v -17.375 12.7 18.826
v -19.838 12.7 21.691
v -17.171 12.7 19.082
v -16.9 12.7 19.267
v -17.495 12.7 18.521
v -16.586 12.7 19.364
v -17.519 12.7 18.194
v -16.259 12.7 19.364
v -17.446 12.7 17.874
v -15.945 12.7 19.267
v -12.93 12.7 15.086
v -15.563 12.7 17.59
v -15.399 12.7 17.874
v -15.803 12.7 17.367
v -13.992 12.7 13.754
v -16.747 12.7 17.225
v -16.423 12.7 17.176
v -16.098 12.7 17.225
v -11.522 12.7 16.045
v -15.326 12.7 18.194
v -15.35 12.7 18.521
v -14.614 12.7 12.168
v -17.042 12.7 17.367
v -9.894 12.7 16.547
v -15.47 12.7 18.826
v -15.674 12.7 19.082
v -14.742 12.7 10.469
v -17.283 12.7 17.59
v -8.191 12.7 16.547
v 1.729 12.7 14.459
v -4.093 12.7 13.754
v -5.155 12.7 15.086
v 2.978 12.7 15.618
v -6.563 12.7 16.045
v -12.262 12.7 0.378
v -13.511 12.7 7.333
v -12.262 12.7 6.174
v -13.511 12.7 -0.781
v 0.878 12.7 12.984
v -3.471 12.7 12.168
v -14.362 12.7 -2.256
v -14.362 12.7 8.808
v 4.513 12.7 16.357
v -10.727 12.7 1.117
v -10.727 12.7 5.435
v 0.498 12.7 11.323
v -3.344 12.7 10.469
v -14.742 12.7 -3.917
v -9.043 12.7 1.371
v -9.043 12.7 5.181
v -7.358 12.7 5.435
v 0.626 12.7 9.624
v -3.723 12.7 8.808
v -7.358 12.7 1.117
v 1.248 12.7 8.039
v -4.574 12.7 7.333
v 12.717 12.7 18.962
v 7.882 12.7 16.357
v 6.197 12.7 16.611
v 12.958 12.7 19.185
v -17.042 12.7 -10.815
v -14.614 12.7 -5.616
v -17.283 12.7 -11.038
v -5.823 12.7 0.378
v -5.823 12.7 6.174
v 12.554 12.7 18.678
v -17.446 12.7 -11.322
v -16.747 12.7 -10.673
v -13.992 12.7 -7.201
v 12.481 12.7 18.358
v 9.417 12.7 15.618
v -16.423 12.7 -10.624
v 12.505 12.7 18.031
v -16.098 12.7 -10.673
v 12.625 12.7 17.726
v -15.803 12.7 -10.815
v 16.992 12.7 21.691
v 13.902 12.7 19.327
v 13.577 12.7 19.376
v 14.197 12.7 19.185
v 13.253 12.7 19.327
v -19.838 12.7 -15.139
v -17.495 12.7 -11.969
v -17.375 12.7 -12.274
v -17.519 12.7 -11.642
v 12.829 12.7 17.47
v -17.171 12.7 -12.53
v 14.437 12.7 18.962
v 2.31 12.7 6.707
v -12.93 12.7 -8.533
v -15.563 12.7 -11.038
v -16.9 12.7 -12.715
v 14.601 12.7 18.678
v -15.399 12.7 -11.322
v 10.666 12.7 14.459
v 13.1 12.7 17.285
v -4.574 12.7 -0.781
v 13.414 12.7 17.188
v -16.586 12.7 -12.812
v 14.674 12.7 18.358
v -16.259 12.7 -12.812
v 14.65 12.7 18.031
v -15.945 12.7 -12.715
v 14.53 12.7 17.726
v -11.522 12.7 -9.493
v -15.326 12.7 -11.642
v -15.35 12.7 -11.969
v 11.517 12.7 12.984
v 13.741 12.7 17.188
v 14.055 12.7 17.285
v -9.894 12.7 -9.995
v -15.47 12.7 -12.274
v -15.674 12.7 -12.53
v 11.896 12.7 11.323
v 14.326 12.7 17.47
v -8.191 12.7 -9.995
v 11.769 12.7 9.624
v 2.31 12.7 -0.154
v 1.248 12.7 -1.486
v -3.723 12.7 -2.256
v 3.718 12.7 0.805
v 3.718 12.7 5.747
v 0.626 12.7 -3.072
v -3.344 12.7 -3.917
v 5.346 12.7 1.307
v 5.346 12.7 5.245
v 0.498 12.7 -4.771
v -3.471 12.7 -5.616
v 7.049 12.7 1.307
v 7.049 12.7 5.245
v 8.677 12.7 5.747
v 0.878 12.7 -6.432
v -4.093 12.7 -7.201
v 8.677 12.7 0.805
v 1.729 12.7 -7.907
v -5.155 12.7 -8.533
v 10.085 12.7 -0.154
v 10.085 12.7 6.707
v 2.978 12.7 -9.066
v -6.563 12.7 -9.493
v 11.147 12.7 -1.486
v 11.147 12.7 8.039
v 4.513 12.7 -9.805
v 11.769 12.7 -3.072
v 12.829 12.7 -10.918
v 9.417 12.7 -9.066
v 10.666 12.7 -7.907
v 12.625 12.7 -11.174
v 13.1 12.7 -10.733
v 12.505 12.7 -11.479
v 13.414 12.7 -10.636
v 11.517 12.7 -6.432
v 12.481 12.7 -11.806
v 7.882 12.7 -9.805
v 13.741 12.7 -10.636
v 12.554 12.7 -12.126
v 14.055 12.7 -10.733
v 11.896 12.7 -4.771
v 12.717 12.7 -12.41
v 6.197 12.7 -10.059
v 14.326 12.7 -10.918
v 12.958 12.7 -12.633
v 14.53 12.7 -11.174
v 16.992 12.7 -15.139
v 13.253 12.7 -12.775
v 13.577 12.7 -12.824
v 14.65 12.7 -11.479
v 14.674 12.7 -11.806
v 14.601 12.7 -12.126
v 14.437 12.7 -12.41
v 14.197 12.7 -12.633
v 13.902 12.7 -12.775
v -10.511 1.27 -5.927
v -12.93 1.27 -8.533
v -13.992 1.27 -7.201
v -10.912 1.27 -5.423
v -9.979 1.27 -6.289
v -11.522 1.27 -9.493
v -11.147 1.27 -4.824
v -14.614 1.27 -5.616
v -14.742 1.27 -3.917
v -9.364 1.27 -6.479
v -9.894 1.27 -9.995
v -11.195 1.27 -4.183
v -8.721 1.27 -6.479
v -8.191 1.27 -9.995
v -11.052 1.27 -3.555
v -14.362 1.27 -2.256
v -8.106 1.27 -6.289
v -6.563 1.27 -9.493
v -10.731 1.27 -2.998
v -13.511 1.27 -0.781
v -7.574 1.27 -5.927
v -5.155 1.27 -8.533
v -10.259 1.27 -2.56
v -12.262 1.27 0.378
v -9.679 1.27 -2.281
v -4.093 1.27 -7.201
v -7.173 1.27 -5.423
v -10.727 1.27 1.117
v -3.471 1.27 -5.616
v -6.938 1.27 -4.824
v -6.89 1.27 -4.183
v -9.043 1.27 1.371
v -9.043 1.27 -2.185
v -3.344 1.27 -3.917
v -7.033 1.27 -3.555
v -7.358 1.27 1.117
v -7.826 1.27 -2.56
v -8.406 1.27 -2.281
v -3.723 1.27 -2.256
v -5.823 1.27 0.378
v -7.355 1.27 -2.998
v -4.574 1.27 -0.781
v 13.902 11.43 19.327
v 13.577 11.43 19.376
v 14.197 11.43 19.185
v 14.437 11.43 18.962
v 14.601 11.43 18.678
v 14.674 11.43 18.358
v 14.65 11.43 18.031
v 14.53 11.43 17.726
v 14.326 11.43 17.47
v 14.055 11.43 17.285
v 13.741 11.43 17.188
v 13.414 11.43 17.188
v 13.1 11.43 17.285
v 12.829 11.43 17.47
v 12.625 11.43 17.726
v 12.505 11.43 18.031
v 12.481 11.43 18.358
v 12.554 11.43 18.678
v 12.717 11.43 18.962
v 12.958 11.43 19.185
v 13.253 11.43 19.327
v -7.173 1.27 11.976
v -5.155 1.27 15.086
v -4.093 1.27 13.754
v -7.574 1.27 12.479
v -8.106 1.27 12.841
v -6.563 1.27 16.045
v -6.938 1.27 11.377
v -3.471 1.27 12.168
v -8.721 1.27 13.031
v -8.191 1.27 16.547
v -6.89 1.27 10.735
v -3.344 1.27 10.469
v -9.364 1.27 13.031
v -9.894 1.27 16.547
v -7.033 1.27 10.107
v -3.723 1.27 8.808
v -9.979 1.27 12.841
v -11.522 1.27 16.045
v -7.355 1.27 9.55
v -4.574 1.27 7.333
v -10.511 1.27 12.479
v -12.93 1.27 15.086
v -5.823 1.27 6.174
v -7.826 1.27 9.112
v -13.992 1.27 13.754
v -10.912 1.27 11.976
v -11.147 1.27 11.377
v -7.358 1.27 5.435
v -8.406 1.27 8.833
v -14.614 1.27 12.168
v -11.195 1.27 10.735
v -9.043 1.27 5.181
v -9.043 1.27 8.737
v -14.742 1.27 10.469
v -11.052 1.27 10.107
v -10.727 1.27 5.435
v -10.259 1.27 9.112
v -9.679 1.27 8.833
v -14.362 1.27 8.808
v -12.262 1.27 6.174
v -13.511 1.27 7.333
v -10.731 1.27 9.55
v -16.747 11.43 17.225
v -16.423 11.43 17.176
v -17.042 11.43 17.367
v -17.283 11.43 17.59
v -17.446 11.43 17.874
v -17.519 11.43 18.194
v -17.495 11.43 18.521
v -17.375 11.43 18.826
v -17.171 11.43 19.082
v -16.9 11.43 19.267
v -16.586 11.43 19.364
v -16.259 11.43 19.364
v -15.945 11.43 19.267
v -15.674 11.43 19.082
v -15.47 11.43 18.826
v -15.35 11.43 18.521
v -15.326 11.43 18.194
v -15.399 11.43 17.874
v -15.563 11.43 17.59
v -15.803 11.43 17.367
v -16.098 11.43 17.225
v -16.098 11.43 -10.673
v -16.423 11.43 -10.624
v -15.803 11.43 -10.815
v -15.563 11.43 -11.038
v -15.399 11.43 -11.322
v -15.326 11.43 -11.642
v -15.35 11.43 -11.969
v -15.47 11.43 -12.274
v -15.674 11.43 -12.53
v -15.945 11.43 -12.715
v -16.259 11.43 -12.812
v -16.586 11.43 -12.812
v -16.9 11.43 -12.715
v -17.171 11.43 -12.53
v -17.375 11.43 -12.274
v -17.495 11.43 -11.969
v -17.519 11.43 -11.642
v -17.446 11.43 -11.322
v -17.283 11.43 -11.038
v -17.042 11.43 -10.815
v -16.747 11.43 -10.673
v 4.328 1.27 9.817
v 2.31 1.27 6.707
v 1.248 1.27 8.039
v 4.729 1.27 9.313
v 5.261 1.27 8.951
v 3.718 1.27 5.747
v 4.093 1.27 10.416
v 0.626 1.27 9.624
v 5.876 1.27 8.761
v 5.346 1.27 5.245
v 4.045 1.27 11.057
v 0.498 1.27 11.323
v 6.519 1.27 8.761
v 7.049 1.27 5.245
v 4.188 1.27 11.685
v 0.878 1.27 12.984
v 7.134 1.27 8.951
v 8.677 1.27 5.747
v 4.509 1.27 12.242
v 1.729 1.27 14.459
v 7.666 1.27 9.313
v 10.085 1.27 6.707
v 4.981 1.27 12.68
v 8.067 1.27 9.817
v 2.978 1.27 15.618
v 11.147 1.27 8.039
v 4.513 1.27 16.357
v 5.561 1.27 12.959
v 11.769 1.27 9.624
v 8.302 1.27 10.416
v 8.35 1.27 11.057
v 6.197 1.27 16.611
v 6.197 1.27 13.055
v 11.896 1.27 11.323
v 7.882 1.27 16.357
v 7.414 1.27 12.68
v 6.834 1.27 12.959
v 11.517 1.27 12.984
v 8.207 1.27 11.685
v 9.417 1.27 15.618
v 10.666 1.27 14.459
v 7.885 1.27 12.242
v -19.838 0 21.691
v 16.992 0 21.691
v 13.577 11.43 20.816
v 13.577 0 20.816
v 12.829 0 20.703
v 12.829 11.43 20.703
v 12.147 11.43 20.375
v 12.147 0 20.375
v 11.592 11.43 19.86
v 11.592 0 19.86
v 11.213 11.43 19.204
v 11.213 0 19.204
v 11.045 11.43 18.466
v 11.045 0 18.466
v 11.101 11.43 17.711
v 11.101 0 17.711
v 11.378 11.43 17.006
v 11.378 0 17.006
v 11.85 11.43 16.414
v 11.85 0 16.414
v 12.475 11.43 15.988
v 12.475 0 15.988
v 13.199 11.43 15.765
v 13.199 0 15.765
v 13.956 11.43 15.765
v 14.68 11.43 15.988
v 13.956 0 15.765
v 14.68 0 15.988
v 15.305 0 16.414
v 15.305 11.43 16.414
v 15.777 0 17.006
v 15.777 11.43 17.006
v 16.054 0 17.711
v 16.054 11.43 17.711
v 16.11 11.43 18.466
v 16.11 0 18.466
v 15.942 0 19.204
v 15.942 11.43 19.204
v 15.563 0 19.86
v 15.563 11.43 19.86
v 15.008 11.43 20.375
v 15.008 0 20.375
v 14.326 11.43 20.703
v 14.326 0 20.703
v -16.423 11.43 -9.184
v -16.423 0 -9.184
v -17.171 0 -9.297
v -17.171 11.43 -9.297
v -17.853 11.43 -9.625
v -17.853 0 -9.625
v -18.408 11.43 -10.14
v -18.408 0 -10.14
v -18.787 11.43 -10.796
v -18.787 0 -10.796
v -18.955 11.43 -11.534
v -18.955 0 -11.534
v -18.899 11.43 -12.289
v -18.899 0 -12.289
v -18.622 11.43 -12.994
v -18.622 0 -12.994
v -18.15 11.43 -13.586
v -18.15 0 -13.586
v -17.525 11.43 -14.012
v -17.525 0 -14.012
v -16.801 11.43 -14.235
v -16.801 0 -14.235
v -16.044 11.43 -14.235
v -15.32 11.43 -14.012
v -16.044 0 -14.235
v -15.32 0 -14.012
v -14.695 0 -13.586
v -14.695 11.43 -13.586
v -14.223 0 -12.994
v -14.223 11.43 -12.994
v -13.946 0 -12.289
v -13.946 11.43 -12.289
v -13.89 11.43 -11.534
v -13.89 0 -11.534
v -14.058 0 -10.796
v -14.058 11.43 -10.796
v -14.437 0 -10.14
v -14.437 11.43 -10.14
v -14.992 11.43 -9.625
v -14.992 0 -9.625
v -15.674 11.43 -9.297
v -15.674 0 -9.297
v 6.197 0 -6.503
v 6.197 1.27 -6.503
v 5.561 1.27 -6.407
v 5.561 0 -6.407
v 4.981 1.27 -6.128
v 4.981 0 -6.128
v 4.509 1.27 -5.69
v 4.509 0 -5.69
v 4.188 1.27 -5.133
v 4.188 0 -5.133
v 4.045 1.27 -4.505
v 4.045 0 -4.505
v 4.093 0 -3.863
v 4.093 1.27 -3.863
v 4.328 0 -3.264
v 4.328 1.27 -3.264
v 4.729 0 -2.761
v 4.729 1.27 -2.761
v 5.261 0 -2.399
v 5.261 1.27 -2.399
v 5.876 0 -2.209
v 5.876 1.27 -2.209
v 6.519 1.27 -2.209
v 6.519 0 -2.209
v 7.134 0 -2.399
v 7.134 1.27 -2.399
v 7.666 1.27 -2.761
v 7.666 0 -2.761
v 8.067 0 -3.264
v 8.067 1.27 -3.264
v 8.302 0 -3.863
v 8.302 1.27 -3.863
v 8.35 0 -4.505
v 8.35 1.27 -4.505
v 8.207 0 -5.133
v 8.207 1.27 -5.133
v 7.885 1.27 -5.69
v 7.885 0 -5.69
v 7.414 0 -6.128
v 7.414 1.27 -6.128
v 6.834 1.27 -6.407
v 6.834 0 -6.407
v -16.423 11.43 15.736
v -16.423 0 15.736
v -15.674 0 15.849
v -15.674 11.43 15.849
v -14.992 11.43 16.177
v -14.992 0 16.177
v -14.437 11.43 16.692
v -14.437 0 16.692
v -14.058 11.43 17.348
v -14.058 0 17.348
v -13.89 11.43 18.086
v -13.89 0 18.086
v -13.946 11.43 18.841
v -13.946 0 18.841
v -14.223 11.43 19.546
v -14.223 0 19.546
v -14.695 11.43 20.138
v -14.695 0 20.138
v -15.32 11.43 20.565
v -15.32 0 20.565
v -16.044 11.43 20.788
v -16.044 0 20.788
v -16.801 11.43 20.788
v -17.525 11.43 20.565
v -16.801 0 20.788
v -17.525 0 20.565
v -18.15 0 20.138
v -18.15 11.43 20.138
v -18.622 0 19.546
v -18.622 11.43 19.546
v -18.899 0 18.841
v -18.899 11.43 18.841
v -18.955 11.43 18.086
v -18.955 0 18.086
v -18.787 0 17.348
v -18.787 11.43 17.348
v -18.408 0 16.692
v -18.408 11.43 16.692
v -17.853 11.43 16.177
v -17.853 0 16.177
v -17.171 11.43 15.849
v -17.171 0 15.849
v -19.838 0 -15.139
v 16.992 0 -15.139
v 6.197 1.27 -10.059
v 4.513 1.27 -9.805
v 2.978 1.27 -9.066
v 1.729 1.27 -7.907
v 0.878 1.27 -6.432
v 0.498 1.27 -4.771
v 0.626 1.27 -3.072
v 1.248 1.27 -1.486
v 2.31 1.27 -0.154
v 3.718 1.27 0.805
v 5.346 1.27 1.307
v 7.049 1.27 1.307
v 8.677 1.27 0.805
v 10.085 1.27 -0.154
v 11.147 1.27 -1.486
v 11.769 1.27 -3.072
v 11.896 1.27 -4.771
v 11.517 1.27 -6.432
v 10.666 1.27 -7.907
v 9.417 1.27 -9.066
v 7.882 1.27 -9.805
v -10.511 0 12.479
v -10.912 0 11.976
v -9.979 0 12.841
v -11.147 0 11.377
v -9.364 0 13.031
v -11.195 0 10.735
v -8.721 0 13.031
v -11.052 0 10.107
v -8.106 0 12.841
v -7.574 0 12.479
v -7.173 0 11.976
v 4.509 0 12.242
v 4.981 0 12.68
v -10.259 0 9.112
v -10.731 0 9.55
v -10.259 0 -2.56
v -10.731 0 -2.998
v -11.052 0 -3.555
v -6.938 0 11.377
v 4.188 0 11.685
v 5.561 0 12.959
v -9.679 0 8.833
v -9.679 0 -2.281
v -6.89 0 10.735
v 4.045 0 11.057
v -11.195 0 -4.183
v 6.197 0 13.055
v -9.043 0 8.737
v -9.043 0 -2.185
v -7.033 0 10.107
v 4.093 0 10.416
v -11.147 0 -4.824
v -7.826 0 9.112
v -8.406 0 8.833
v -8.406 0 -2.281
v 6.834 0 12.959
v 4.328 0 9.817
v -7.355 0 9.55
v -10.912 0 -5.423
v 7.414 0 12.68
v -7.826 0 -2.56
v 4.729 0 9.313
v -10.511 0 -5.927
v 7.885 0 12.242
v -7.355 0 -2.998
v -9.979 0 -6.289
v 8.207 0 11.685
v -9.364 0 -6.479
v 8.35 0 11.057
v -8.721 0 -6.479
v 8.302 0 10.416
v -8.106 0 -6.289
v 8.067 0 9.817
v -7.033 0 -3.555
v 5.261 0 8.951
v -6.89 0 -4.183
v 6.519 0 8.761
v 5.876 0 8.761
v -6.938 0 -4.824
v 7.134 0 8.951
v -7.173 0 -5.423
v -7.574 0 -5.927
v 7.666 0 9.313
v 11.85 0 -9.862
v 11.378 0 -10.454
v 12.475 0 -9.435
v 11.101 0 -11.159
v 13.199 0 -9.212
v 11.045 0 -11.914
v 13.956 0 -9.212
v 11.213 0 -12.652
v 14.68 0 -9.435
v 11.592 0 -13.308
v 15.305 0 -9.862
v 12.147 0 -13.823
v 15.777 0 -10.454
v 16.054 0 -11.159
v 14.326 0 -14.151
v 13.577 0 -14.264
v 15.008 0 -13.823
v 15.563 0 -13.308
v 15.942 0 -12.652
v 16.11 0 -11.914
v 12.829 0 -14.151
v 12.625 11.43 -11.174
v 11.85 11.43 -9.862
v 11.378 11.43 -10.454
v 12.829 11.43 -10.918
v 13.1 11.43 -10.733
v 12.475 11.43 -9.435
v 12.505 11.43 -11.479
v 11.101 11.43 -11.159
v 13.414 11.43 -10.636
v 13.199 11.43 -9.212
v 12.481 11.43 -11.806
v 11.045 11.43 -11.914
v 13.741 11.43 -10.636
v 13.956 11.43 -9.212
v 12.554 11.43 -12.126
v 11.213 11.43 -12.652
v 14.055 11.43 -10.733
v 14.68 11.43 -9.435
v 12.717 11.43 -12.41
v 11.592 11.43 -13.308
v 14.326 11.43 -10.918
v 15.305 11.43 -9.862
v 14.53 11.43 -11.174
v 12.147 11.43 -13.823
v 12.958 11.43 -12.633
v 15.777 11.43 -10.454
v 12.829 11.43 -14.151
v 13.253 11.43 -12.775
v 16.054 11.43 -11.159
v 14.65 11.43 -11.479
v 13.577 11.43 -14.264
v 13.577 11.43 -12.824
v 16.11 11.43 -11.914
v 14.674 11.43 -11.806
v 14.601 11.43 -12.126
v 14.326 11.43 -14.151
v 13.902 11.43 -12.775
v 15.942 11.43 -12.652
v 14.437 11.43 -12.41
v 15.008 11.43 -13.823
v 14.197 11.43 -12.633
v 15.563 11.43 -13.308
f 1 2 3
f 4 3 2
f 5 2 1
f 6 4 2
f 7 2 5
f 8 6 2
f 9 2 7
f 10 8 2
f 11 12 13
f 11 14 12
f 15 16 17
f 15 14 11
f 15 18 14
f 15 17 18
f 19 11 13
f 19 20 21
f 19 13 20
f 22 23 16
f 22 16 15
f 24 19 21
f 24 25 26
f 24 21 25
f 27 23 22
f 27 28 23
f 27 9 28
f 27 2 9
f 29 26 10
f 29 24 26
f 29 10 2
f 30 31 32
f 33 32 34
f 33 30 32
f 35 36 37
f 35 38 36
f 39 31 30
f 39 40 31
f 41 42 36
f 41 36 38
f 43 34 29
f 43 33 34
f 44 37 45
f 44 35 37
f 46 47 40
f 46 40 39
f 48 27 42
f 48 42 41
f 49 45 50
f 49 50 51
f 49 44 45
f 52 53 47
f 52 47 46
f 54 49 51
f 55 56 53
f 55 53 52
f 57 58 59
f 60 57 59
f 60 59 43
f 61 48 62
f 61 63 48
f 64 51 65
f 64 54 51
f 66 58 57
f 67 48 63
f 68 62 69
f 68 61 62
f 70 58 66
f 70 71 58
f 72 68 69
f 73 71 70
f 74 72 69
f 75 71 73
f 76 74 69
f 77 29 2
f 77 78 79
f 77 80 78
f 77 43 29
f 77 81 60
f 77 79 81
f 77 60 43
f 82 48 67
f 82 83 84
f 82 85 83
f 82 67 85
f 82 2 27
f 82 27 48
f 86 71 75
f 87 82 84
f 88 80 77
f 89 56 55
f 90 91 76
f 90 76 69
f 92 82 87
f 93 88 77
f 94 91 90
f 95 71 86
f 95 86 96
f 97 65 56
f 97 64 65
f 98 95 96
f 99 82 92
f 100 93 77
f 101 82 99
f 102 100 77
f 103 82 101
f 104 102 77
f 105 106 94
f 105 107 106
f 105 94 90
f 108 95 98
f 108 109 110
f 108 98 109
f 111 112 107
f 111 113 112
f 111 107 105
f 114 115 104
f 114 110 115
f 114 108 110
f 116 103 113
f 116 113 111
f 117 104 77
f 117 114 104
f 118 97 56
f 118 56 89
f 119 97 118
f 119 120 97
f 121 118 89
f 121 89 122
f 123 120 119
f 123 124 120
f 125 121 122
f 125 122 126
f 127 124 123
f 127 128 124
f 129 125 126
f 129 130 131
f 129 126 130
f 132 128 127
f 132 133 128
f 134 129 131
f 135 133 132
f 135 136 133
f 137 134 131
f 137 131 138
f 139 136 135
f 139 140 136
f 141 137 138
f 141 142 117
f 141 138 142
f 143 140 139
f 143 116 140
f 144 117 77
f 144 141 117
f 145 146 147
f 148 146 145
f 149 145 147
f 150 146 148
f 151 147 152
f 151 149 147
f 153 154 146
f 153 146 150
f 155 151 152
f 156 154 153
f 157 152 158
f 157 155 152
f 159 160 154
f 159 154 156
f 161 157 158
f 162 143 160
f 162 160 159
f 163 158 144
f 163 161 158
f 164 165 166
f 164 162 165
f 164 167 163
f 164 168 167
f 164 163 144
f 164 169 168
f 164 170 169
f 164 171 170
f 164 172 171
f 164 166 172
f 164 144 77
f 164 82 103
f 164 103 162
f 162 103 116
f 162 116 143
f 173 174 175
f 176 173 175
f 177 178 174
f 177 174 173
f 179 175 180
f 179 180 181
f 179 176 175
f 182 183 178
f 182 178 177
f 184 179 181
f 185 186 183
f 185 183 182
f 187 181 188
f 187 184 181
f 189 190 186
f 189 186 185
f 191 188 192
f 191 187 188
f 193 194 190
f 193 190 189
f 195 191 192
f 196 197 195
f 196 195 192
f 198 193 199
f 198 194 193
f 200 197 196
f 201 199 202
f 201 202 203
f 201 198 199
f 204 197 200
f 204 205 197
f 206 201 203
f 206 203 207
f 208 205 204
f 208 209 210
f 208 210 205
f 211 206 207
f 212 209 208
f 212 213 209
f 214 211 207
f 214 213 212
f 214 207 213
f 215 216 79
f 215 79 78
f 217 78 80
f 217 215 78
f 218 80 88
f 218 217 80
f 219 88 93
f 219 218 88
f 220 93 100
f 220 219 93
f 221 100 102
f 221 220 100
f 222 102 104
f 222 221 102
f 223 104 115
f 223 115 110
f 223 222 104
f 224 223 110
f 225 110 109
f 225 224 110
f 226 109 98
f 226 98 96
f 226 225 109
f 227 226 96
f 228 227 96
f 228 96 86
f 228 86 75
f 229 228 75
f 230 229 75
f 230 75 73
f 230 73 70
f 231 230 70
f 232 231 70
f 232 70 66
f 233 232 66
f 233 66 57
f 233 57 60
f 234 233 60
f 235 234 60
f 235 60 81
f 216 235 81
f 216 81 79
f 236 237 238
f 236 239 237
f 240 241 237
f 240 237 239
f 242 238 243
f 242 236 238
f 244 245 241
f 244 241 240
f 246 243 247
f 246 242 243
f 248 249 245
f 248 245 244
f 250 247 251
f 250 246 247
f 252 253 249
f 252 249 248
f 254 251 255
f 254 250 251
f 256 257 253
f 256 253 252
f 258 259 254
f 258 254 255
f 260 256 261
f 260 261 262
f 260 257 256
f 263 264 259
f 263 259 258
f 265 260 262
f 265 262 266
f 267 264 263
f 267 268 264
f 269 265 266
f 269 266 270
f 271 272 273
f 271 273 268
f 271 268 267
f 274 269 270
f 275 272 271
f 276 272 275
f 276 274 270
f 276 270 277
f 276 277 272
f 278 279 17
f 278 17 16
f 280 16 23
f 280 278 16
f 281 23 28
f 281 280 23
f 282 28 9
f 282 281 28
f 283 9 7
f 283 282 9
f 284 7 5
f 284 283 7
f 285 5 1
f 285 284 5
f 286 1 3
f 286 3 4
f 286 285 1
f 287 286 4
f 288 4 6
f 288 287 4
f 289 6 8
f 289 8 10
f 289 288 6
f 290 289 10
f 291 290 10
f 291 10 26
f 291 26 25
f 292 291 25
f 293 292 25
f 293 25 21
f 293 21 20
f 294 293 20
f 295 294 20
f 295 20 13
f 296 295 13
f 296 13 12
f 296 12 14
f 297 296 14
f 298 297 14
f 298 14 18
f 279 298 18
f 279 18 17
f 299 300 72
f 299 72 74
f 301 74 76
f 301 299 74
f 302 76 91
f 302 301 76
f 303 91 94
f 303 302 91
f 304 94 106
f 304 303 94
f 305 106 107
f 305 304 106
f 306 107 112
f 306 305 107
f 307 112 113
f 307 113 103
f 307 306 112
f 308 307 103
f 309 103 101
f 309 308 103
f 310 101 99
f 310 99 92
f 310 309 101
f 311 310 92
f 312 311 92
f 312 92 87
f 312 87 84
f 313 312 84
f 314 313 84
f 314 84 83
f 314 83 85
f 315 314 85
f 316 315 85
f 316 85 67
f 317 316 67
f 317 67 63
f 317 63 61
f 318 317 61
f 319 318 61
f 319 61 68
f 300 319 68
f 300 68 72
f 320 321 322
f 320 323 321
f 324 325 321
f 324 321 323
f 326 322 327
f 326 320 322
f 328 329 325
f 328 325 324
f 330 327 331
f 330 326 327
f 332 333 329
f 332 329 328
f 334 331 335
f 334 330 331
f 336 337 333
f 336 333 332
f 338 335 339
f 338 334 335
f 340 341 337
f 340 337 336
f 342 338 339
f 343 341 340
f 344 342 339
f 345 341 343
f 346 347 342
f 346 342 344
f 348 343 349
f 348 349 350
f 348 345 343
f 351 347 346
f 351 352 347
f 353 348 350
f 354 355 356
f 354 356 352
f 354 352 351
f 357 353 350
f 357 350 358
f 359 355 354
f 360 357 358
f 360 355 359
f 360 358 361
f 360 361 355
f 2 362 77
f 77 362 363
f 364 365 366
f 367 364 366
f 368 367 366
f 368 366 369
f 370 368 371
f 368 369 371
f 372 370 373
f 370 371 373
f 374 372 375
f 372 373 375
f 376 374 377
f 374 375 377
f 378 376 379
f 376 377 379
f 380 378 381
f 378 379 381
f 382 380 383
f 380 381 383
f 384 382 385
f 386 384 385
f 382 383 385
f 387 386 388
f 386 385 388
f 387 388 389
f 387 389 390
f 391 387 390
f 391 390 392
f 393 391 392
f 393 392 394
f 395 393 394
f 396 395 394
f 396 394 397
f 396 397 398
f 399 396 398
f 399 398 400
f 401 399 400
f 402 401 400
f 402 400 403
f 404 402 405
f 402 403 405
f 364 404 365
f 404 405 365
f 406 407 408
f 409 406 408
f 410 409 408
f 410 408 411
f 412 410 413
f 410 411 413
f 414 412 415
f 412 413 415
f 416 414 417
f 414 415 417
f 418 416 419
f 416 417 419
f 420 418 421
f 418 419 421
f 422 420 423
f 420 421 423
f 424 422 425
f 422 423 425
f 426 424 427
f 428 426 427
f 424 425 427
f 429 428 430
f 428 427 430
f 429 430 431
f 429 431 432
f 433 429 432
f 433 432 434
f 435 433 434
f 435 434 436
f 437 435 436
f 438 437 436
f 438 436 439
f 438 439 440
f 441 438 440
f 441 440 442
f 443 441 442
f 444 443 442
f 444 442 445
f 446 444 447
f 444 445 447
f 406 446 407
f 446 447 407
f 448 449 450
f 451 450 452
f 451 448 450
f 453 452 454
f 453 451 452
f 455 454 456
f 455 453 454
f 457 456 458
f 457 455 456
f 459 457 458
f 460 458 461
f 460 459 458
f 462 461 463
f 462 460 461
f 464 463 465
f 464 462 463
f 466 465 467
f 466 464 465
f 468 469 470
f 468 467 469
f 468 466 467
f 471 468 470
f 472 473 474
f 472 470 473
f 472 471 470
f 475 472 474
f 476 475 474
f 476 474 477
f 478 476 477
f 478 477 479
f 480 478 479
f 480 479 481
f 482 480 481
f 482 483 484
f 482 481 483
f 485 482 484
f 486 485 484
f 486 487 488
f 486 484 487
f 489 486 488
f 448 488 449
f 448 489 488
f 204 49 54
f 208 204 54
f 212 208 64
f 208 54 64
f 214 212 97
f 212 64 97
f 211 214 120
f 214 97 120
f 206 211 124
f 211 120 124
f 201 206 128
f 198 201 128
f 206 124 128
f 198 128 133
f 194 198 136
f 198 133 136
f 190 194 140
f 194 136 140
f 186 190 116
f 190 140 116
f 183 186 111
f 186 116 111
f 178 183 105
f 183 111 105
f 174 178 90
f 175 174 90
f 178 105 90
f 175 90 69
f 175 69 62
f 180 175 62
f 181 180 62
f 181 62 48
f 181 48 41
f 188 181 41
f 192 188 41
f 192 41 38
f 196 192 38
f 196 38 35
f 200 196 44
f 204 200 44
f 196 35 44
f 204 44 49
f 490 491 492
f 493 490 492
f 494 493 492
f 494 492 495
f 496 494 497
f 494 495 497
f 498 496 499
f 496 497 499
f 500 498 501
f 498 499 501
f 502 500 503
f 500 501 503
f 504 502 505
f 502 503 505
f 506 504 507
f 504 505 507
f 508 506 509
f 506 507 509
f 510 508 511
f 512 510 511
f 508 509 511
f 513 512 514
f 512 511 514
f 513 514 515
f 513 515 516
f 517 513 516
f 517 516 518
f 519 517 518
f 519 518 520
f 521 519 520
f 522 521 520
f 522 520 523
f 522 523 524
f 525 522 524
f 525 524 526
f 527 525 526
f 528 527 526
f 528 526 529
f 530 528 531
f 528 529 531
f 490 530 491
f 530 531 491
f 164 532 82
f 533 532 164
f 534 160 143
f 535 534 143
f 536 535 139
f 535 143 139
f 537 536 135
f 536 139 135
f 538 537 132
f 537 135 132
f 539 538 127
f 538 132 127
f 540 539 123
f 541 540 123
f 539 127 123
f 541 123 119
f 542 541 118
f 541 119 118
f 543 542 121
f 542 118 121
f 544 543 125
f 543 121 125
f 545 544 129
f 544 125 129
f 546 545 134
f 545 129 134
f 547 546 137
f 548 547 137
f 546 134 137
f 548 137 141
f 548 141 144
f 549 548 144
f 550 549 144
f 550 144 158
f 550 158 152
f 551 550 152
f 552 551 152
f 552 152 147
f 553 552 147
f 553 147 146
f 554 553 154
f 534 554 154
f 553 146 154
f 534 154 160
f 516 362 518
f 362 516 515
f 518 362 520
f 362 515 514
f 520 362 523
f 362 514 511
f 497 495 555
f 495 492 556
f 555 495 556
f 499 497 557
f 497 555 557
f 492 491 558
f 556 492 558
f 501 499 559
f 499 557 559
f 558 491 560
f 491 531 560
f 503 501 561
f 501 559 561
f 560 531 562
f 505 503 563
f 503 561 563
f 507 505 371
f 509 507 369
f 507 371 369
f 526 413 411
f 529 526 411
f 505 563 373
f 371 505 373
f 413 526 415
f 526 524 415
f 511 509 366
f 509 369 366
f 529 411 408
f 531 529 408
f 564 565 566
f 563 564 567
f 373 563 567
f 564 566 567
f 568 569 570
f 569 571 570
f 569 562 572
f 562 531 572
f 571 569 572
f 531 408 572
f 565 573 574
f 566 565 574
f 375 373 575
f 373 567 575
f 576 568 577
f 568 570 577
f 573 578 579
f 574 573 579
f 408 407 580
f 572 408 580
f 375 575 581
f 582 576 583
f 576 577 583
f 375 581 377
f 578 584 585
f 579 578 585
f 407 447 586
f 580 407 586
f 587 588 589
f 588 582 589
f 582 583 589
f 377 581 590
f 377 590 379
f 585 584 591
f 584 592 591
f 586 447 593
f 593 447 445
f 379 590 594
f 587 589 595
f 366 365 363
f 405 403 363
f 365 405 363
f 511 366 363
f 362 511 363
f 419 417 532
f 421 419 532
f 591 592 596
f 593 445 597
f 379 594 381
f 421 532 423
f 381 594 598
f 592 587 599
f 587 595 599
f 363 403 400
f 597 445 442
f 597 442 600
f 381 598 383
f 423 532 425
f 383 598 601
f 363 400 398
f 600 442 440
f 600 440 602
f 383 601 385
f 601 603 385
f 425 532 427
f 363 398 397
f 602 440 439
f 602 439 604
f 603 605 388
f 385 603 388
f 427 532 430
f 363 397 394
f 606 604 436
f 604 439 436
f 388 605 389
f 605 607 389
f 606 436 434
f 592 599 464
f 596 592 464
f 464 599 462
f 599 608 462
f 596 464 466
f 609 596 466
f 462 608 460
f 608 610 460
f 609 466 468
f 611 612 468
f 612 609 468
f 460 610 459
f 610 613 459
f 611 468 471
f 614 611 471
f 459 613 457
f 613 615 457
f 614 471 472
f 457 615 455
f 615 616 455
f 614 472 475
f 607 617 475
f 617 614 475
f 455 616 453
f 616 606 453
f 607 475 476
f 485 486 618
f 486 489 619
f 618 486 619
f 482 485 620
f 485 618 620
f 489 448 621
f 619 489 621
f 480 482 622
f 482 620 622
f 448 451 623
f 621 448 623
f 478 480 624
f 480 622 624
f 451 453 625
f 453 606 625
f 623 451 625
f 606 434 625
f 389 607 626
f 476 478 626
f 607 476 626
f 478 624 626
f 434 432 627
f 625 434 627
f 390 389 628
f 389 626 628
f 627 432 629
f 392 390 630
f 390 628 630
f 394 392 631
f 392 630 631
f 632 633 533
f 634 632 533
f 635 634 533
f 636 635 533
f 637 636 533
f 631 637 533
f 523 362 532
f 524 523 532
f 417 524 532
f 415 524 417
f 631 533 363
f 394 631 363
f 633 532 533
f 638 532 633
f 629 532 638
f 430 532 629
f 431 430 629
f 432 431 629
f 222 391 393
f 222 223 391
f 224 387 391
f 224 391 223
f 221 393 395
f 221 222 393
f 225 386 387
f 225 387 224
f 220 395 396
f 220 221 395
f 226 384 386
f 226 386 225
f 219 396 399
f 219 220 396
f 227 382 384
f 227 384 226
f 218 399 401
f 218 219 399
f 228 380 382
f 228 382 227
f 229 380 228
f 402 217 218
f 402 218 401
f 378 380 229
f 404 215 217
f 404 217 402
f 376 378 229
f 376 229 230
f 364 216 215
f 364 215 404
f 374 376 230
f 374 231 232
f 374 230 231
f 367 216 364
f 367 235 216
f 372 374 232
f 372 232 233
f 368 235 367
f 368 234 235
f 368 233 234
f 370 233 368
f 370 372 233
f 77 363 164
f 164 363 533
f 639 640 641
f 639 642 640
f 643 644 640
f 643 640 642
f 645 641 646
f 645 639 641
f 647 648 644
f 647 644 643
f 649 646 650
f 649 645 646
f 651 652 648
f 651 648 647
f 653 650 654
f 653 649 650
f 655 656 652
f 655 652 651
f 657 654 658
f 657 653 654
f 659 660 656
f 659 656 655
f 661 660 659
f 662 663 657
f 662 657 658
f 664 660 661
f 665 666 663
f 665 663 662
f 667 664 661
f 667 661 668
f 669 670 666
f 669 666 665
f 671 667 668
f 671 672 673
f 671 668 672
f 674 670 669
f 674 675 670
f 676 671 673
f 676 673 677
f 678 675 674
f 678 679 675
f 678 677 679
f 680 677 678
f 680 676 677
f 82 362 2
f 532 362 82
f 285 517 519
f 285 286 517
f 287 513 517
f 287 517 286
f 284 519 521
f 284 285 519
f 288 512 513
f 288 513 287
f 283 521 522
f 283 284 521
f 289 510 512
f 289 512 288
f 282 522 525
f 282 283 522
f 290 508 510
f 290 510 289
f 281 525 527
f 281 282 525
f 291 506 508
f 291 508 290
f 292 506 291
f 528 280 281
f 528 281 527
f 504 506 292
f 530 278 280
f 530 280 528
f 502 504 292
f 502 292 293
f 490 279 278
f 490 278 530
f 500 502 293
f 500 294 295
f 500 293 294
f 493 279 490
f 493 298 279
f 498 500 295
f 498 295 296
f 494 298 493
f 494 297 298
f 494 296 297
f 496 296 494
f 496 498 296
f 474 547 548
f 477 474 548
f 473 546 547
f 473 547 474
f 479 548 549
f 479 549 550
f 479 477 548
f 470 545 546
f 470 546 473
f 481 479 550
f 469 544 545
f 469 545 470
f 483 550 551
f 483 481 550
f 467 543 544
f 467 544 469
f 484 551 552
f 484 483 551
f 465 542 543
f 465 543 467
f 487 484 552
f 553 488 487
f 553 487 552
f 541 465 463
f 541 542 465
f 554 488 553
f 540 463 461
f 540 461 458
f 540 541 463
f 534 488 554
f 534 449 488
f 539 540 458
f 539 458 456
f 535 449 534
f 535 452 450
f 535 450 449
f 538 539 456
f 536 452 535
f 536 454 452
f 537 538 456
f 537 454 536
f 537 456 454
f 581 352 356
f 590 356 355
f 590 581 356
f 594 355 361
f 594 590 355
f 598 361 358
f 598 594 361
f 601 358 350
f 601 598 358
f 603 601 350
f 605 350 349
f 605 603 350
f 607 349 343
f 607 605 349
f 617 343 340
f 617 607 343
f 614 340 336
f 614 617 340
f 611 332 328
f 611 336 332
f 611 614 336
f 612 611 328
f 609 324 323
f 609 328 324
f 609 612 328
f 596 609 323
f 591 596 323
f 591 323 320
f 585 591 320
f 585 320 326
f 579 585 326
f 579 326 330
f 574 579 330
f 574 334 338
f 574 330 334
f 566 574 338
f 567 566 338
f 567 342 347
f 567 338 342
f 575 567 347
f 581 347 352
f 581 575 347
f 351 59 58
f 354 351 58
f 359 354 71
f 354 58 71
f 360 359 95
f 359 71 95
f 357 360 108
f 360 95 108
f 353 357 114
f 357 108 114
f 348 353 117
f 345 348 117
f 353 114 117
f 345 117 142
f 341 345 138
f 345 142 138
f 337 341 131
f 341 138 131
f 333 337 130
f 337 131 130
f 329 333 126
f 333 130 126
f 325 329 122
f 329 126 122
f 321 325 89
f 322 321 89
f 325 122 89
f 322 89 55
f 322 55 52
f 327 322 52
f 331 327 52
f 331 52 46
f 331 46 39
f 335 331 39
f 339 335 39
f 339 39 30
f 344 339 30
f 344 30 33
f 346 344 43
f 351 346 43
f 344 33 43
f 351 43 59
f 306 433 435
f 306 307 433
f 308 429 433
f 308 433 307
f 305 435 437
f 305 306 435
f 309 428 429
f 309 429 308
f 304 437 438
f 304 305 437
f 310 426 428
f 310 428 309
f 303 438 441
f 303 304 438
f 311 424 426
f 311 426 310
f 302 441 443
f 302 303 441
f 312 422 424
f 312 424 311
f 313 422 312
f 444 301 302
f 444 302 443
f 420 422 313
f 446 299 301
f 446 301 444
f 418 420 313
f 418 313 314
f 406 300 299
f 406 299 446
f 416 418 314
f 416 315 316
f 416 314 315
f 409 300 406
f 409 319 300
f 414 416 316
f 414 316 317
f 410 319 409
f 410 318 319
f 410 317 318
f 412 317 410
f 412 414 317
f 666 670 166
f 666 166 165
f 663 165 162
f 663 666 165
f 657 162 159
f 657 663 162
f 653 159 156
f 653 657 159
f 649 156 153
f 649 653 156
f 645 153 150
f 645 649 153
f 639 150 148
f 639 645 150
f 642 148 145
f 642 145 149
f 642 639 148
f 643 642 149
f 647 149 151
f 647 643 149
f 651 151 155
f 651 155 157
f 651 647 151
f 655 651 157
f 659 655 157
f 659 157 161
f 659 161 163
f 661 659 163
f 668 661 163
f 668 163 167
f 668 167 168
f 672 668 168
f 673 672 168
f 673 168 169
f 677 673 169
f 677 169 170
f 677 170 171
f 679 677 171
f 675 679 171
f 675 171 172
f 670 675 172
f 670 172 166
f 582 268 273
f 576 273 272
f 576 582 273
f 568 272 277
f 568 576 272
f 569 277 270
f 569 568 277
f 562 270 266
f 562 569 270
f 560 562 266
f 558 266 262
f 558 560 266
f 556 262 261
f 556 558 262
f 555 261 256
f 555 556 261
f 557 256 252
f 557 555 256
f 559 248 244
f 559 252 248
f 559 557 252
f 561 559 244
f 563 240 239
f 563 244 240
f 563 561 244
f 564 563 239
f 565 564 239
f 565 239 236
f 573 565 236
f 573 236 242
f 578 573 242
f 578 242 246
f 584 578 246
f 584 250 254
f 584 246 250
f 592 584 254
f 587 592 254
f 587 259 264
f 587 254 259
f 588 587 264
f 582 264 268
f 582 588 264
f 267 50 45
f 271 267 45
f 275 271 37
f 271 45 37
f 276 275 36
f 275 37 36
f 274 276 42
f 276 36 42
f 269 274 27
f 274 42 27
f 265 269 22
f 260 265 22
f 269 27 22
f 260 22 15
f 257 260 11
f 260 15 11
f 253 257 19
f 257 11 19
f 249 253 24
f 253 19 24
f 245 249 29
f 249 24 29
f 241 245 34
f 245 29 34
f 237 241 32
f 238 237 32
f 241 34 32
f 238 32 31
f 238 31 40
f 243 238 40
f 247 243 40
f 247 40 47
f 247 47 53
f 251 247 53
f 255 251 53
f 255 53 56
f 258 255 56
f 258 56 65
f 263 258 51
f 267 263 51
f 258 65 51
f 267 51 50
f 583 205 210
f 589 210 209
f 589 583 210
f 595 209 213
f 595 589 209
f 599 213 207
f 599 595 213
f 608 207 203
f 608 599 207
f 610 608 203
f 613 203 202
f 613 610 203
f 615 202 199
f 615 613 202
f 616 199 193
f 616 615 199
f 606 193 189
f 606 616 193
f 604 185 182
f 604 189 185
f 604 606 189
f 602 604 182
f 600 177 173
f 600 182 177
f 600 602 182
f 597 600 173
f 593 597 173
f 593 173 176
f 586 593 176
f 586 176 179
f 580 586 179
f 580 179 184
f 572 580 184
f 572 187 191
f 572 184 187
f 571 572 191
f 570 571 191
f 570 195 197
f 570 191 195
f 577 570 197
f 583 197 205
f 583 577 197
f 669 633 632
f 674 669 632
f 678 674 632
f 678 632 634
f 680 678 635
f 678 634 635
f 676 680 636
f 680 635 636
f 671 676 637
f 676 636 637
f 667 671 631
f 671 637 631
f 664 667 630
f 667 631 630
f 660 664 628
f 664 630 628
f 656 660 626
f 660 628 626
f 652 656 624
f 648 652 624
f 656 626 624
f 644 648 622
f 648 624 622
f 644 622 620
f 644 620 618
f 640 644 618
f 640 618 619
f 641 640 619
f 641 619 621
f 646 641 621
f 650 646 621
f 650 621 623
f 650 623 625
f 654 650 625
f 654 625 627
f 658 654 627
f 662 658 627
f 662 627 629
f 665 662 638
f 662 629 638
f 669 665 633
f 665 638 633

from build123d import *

# Parameters (mm, degrees)
SKETCH1_W           = 36.83
SKETCH1_H           = 36.83
SKETCH1_R           = 1.0999978
SKETCH1_R_2         = 2.159
BOSS_EXTRUDE1_DEPTH = 12.7
SKETCH2_R           = 5.715
CUT_EXTRUDE1_DEPTH  = 11.43
SKETCH3_R           = 2.54
CUT_EXTRUDE2_DEPTH  = 11.43


with BuildPart() as part:
    # Sketch1 → Boss-Extrude1 (new body)
    with BuildSketch(Plane(origin=(0, 0, 0), x_dir=(1, 0, 0), z_dir=(0, 1, 0))):
        with Locations((-1.422532637, -3.27613577)):
            Rectangle(SKETCH1_W, SKETCH1_H)
        with Locations(Location((-16.422528037, 11.72385963, 0), (0, 0, 270))):
            Circle(SKETCH1_R, mode=Mode.SUBTRACT)
        with Locations(Location((13.577462763, 11.72385963, 0), (0, 0, 90))):
            Circle(SKETCH1_R, mode=Mode.SUBTRACT)
        with Locations(Location((13.577462763, -18.27613117, 0), (0, 0, 270))):
            Circle(SKETCH1_R, mode=Mode.SUBTRACT)
        with Locations(Location((-16.422528037, -18.27613117, 0), (0, 0, 90))):
            Circle(SKETCH1_R, mode=Mode.SUBTRACT)
        with Locations(Location((-9.042532637, 4.34386423, 0), (0, 0, 270))):
            Circle(SKETCH1_R_2, mode=Mode.SUBTRACT)
        with Locations(Location((6.197467363, 4.34386423, 0), (0, 0, 90))):
            Circle(SKETCH1_R_2, mode=Mode.SUBTRACT)
        with Locations(Location((6.197467363, -10.89613577, 0), (0, 0, 270))):
            Circle(SKETCH1_R_2, mode=Mode.SUBTRACT)
        with Locations(Location((-9.042532637, -10.89613577, 0), (0, 0, 90))):
            Circle(SKETCH1_R_2, mode=Mode.SUBTRACT)
    extrude(amount=BOSS_EXTRUDE1_DEPTH)

    # Sketch2 → Cut-Extrude1 (cut)
    with BuildSketch(Plane(origin=(0, 12.7, 0), x_dir=(1, 0, 0), z_dir=(0, 1, 0))):
        with Locations(Location((-9.042532637, 4.34386423, 0), (0, 0, 270))):
            Circle(SKETCH2_R)
        with Locations(Location((6.197467363, 4.34386423, 0), (0, 0, 90))):
            Circle(SKETCH2_R)
        with Locations(Location((6.197467363, -10.89613577, 0), (0, 0, 270))):
            Circle(SKETCH2_R)
        with Locations(Location((-9.042532637, -10.89613577, 0), (0, 0, 90))):
            Circle(SKETCH2_R)
    extrude(amount=-CUT_EXTRUDE1_DEPTH, mode=Mode.SUBTRACT)

    # Sketch3 → Cut-Extrude2 (cut)
    with BuildSketch(Plane.XZ):
        with Locations(Location((-16.422528037, 18.27613117, 0), (0, 0, 270))):
            Circle(SKETCH3_R)
        with Locations(Location((13.577462763, 18.27613117, 0), (0, 0, 90))):
            Circle(SKETCH3_R)
        with Locations(Location((13.577462763, -11.72385963, 0), (0, 0, 270))):
            Circle(SKETCH3_R)
        with Locations(Location((-16.422528037, -11.72385963, 0), (0, 0, 90))):
            Circle(SKETCH3_R)
    extrude(amount=-CUT_EXTRUDE2_DEPTH, mode=Mode.SUBTRACT)


solid = part.part
